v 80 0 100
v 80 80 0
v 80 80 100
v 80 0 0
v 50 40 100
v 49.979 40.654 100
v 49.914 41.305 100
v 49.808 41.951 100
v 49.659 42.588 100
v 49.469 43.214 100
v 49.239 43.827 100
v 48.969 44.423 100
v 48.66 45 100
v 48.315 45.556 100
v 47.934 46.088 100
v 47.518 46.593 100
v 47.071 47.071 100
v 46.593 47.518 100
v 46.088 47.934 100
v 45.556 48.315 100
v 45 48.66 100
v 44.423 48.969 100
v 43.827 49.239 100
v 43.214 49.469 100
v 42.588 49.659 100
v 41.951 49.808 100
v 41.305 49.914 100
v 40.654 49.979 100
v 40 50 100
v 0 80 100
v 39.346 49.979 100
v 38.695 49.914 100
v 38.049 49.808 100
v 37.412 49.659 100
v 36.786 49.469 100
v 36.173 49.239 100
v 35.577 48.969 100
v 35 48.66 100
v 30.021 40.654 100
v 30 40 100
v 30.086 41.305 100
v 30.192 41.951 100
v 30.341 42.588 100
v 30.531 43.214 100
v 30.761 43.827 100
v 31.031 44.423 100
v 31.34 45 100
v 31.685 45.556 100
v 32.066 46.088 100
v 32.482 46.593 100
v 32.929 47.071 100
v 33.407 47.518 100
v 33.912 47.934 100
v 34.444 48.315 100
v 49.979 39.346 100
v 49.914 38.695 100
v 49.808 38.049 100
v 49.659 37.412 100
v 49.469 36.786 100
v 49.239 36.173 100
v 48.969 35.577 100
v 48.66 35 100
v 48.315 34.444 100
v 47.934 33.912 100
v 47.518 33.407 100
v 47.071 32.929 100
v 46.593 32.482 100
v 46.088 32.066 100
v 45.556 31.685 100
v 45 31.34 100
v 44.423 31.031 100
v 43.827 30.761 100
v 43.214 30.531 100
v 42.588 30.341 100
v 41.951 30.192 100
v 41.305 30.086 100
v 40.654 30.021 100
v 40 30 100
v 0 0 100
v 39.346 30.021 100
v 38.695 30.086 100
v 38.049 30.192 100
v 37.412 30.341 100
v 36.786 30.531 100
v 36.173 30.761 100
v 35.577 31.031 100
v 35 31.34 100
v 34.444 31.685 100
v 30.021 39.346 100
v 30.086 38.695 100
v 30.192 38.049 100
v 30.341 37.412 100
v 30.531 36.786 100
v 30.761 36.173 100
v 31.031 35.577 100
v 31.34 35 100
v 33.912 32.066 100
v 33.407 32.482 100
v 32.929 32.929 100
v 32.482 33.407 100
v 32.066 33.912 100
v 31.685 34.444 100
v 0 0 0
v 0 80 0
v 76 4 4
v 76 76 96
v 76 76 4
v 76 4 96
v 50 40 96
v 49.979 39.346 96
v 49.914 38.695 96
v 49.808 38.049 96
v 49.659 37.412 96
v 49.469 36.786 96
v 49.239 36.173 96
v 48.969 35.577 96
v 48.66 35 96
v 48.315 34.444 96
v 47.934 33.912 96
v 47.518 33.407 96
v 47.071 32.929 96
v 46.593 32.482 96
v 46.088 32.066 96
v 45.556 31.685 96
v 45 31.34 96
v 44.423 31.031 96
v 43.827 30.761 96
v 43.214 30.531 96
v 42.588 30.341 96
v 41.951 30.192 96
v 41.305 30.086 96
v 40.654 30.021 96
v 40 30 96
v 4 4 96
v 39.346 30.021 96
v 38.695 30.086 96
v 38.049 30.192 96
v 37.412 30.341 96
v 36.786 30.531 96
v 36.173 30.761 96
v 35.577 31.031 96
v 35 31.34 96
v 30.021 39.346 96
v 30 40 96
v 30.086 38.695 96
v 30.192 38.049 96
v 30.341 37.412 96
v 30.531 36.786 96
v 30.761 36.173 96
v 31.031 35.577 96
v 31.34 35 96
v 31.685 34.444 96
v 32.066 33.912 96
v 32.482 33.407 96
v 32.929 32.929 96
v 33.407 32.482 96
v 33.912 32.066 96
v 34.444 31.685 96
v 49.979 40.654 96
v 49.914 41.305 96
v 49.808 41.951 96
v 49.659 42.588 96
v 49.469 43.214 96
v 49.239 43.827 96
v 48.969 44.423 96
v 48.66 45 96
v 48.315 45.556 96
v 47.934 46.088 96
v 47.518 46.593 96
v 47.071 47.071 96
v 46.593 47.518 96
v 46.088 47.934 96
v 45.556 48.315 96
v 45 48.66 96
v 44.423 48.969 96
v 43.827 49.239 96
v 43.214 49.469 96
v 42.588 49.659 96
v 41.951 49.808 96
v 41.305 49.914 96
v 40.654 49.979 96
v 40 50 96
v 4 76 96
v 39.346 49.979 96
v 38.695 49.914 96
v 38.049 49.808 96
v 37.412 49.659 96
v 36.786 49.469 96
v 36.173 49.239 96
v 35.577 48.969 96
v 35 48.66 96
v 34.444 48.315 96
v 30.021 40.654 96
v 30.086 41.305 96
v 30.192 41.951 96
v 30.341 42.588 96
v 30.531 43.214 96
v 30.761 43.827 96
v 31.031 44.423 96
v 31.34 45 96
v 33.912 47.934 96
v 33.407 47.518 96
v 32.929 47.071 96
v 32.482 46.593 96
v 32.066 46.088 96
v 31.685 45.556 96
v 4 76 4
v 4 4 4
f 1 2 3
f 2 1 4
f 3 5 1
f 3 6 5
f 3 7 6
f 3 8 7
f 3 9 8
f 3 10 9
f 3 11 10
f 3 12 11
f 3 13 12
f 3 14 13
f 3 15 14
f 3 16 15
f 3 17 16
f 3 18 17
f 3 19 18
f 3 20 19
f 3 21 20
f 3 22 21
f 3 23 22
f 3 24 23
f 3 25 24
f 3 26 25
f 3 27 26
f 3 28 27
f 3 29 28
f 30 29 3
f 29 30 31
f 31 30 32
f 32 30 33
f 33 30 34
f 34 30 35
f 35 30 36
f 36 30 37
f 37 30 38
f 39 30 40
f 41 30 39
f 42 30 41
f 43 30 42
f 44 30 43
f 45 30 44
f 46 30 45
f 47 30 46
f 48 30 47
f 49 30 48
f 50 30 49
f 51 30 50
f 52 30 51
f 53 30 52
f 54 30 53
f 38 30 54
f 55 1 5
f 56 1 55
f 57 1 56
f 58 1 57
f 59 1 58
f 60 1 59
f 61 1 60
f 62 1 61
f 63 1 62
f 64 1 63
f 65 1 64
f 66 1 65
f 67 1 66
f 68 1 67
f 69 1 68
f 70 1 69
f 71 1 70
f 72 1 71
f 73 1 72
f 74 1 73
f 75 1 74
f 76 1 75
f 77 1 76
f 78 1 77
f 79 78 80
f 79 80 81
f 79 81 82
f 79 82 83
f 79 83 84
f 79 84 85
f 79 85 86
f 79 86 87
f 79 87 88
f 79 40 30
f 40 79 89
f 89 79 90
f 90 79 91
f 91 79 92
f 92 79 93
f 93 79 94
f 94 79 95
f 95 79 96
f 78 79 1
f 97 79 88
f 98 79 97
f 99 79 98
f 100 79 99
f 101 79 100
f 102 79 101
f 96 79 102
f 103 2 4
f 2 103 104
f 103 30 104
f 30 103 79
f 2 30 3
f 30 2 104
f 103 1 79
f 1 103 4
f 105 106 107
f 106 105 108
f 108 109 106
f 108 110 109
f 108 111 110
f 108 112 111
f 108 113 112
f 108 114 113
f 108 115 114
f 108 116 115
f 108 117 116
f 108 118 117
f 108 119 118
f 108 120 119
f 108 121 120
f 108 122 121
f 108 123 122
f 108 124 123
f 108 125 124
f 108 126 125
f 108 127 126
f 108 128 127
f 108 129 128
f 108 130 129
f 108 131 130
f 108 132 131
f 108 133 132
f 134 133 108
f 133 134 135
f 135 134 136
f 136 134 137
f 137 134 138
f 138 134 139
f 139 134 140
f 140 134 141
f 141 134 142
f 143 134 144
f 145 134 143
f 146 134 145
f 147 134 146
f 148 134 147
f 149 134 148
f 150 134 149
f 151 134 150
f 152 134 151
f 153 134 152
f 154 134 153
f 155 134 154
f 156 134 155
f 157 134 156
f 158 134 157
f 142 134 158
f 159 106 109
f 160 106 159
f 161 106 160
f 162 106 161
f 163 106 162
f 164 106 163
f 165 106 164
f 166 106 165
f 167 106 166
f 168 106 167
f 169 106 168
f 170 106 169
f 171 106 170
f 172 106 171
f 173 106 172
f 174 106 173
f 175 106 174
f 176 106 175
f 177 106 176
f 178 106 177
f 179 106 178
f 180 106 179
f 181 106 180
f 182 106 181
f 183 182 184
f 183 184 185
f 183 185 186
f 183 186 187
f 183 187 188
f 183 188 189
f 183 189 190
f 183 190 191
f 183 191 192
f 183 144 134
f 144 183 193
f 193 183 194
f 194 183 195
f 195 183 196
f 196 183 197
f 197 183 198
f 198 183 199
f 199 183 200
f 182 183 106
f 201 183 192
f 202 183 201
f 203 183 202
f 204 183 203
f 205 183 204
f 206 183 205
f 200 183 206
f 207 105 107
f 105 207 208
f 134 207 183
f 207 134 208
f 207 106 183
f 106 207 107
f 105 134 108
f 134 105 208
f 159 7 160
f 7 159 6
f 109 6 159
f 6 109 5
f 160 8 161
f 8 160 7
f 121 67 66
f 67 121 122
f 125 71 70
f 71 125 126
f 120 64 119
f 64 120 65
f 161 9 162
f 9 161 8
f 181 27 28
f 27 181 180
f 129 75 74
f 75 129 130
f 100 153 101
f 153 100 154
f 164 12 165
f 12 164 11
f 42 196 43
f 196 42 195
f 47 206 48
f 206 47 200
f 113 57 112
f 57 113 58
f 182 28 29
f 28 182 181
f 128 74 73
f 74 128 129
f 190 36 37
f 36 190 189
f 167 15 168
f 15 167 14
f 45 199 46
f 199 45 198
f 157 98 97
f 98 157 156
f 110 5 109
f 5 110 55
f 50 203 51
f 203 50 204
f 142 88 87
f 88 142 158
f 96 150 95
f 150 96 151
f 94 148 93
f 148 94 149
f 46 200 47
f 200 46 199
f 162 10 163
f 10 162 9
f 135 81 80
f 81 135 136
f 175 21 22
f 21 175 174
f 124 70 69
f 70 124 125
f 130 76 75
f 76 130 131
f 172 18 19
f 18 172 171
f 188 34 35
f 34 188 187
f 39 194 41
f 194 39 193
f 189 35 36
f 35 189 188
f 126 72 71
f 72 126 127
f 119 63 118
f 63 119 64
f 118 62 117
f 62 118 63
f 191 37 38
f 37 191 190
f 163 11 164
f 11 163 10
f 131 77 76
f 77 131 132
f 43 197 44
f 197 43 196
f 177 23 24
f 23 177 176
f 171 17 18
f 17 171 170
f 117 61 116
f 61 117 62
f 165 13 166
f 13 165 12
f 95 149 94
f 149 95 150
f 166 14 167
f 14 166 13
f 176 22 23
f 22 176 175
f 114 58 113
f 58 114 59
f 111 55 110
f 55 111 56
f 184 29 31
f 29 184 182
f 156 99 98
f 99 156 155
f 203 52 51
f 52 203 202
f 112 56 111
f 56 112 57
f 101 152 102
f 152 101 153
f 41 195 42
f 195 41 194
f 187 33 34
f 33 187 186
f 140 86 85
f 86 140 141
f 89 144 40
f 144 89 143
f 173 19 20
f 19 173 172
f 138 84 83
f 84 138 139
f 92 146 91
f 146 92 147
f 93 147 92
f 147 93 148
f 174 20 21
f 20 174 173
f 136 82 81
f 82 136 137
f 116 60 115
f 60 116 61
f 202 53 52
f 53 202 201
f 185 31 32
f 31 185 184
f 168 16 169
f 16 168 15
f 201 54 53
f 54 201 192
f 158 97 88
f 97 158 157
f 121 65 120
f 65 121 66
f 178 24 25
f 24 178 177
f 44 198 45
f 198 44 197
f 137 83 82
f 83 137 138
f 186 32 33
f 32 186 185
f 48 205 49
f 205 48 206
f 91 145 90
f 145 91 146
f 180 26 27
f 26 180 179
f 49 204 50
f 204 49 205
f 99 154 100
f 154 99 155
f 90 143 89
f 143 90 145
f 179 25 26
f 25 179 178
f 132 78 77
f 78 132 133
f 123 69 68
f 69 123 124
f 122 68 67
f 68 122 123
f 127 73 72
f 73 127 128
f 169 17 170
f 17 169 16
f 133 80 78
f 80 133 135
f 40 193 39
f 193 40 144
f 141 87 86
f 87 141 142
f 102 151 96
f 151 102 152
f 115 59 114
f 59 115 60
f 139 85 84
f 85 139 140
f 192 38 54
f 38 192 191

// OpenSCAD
// 80 mm x 80 mm x 100 mm hollow box with a centered circular hole in the top.
// Wall and top/bottom thickness are 4 mm.

outer_x = 80;
outer_y = 80;
height = 100;
wall = 4;
top_hole_diameter = 20;

difference() {
    cube([outer_x, outer_y, height], center = false);

    // Hollow interior, leaving a 4 mm floor and 4 mm top.
    translate([wall, wall, wall])
        cube([
            outer_x - 2 * wall,
            outer_y - 2 * wall,
            height - 2 * wall
        ], center = false);

    // Centered hole through the top face.
    translate([outer_x / 2, outer_y / 2, height - wall - 1])
        cylinder(h = wall + 2, d = top_hole_diameter, $fn = 96);
}
